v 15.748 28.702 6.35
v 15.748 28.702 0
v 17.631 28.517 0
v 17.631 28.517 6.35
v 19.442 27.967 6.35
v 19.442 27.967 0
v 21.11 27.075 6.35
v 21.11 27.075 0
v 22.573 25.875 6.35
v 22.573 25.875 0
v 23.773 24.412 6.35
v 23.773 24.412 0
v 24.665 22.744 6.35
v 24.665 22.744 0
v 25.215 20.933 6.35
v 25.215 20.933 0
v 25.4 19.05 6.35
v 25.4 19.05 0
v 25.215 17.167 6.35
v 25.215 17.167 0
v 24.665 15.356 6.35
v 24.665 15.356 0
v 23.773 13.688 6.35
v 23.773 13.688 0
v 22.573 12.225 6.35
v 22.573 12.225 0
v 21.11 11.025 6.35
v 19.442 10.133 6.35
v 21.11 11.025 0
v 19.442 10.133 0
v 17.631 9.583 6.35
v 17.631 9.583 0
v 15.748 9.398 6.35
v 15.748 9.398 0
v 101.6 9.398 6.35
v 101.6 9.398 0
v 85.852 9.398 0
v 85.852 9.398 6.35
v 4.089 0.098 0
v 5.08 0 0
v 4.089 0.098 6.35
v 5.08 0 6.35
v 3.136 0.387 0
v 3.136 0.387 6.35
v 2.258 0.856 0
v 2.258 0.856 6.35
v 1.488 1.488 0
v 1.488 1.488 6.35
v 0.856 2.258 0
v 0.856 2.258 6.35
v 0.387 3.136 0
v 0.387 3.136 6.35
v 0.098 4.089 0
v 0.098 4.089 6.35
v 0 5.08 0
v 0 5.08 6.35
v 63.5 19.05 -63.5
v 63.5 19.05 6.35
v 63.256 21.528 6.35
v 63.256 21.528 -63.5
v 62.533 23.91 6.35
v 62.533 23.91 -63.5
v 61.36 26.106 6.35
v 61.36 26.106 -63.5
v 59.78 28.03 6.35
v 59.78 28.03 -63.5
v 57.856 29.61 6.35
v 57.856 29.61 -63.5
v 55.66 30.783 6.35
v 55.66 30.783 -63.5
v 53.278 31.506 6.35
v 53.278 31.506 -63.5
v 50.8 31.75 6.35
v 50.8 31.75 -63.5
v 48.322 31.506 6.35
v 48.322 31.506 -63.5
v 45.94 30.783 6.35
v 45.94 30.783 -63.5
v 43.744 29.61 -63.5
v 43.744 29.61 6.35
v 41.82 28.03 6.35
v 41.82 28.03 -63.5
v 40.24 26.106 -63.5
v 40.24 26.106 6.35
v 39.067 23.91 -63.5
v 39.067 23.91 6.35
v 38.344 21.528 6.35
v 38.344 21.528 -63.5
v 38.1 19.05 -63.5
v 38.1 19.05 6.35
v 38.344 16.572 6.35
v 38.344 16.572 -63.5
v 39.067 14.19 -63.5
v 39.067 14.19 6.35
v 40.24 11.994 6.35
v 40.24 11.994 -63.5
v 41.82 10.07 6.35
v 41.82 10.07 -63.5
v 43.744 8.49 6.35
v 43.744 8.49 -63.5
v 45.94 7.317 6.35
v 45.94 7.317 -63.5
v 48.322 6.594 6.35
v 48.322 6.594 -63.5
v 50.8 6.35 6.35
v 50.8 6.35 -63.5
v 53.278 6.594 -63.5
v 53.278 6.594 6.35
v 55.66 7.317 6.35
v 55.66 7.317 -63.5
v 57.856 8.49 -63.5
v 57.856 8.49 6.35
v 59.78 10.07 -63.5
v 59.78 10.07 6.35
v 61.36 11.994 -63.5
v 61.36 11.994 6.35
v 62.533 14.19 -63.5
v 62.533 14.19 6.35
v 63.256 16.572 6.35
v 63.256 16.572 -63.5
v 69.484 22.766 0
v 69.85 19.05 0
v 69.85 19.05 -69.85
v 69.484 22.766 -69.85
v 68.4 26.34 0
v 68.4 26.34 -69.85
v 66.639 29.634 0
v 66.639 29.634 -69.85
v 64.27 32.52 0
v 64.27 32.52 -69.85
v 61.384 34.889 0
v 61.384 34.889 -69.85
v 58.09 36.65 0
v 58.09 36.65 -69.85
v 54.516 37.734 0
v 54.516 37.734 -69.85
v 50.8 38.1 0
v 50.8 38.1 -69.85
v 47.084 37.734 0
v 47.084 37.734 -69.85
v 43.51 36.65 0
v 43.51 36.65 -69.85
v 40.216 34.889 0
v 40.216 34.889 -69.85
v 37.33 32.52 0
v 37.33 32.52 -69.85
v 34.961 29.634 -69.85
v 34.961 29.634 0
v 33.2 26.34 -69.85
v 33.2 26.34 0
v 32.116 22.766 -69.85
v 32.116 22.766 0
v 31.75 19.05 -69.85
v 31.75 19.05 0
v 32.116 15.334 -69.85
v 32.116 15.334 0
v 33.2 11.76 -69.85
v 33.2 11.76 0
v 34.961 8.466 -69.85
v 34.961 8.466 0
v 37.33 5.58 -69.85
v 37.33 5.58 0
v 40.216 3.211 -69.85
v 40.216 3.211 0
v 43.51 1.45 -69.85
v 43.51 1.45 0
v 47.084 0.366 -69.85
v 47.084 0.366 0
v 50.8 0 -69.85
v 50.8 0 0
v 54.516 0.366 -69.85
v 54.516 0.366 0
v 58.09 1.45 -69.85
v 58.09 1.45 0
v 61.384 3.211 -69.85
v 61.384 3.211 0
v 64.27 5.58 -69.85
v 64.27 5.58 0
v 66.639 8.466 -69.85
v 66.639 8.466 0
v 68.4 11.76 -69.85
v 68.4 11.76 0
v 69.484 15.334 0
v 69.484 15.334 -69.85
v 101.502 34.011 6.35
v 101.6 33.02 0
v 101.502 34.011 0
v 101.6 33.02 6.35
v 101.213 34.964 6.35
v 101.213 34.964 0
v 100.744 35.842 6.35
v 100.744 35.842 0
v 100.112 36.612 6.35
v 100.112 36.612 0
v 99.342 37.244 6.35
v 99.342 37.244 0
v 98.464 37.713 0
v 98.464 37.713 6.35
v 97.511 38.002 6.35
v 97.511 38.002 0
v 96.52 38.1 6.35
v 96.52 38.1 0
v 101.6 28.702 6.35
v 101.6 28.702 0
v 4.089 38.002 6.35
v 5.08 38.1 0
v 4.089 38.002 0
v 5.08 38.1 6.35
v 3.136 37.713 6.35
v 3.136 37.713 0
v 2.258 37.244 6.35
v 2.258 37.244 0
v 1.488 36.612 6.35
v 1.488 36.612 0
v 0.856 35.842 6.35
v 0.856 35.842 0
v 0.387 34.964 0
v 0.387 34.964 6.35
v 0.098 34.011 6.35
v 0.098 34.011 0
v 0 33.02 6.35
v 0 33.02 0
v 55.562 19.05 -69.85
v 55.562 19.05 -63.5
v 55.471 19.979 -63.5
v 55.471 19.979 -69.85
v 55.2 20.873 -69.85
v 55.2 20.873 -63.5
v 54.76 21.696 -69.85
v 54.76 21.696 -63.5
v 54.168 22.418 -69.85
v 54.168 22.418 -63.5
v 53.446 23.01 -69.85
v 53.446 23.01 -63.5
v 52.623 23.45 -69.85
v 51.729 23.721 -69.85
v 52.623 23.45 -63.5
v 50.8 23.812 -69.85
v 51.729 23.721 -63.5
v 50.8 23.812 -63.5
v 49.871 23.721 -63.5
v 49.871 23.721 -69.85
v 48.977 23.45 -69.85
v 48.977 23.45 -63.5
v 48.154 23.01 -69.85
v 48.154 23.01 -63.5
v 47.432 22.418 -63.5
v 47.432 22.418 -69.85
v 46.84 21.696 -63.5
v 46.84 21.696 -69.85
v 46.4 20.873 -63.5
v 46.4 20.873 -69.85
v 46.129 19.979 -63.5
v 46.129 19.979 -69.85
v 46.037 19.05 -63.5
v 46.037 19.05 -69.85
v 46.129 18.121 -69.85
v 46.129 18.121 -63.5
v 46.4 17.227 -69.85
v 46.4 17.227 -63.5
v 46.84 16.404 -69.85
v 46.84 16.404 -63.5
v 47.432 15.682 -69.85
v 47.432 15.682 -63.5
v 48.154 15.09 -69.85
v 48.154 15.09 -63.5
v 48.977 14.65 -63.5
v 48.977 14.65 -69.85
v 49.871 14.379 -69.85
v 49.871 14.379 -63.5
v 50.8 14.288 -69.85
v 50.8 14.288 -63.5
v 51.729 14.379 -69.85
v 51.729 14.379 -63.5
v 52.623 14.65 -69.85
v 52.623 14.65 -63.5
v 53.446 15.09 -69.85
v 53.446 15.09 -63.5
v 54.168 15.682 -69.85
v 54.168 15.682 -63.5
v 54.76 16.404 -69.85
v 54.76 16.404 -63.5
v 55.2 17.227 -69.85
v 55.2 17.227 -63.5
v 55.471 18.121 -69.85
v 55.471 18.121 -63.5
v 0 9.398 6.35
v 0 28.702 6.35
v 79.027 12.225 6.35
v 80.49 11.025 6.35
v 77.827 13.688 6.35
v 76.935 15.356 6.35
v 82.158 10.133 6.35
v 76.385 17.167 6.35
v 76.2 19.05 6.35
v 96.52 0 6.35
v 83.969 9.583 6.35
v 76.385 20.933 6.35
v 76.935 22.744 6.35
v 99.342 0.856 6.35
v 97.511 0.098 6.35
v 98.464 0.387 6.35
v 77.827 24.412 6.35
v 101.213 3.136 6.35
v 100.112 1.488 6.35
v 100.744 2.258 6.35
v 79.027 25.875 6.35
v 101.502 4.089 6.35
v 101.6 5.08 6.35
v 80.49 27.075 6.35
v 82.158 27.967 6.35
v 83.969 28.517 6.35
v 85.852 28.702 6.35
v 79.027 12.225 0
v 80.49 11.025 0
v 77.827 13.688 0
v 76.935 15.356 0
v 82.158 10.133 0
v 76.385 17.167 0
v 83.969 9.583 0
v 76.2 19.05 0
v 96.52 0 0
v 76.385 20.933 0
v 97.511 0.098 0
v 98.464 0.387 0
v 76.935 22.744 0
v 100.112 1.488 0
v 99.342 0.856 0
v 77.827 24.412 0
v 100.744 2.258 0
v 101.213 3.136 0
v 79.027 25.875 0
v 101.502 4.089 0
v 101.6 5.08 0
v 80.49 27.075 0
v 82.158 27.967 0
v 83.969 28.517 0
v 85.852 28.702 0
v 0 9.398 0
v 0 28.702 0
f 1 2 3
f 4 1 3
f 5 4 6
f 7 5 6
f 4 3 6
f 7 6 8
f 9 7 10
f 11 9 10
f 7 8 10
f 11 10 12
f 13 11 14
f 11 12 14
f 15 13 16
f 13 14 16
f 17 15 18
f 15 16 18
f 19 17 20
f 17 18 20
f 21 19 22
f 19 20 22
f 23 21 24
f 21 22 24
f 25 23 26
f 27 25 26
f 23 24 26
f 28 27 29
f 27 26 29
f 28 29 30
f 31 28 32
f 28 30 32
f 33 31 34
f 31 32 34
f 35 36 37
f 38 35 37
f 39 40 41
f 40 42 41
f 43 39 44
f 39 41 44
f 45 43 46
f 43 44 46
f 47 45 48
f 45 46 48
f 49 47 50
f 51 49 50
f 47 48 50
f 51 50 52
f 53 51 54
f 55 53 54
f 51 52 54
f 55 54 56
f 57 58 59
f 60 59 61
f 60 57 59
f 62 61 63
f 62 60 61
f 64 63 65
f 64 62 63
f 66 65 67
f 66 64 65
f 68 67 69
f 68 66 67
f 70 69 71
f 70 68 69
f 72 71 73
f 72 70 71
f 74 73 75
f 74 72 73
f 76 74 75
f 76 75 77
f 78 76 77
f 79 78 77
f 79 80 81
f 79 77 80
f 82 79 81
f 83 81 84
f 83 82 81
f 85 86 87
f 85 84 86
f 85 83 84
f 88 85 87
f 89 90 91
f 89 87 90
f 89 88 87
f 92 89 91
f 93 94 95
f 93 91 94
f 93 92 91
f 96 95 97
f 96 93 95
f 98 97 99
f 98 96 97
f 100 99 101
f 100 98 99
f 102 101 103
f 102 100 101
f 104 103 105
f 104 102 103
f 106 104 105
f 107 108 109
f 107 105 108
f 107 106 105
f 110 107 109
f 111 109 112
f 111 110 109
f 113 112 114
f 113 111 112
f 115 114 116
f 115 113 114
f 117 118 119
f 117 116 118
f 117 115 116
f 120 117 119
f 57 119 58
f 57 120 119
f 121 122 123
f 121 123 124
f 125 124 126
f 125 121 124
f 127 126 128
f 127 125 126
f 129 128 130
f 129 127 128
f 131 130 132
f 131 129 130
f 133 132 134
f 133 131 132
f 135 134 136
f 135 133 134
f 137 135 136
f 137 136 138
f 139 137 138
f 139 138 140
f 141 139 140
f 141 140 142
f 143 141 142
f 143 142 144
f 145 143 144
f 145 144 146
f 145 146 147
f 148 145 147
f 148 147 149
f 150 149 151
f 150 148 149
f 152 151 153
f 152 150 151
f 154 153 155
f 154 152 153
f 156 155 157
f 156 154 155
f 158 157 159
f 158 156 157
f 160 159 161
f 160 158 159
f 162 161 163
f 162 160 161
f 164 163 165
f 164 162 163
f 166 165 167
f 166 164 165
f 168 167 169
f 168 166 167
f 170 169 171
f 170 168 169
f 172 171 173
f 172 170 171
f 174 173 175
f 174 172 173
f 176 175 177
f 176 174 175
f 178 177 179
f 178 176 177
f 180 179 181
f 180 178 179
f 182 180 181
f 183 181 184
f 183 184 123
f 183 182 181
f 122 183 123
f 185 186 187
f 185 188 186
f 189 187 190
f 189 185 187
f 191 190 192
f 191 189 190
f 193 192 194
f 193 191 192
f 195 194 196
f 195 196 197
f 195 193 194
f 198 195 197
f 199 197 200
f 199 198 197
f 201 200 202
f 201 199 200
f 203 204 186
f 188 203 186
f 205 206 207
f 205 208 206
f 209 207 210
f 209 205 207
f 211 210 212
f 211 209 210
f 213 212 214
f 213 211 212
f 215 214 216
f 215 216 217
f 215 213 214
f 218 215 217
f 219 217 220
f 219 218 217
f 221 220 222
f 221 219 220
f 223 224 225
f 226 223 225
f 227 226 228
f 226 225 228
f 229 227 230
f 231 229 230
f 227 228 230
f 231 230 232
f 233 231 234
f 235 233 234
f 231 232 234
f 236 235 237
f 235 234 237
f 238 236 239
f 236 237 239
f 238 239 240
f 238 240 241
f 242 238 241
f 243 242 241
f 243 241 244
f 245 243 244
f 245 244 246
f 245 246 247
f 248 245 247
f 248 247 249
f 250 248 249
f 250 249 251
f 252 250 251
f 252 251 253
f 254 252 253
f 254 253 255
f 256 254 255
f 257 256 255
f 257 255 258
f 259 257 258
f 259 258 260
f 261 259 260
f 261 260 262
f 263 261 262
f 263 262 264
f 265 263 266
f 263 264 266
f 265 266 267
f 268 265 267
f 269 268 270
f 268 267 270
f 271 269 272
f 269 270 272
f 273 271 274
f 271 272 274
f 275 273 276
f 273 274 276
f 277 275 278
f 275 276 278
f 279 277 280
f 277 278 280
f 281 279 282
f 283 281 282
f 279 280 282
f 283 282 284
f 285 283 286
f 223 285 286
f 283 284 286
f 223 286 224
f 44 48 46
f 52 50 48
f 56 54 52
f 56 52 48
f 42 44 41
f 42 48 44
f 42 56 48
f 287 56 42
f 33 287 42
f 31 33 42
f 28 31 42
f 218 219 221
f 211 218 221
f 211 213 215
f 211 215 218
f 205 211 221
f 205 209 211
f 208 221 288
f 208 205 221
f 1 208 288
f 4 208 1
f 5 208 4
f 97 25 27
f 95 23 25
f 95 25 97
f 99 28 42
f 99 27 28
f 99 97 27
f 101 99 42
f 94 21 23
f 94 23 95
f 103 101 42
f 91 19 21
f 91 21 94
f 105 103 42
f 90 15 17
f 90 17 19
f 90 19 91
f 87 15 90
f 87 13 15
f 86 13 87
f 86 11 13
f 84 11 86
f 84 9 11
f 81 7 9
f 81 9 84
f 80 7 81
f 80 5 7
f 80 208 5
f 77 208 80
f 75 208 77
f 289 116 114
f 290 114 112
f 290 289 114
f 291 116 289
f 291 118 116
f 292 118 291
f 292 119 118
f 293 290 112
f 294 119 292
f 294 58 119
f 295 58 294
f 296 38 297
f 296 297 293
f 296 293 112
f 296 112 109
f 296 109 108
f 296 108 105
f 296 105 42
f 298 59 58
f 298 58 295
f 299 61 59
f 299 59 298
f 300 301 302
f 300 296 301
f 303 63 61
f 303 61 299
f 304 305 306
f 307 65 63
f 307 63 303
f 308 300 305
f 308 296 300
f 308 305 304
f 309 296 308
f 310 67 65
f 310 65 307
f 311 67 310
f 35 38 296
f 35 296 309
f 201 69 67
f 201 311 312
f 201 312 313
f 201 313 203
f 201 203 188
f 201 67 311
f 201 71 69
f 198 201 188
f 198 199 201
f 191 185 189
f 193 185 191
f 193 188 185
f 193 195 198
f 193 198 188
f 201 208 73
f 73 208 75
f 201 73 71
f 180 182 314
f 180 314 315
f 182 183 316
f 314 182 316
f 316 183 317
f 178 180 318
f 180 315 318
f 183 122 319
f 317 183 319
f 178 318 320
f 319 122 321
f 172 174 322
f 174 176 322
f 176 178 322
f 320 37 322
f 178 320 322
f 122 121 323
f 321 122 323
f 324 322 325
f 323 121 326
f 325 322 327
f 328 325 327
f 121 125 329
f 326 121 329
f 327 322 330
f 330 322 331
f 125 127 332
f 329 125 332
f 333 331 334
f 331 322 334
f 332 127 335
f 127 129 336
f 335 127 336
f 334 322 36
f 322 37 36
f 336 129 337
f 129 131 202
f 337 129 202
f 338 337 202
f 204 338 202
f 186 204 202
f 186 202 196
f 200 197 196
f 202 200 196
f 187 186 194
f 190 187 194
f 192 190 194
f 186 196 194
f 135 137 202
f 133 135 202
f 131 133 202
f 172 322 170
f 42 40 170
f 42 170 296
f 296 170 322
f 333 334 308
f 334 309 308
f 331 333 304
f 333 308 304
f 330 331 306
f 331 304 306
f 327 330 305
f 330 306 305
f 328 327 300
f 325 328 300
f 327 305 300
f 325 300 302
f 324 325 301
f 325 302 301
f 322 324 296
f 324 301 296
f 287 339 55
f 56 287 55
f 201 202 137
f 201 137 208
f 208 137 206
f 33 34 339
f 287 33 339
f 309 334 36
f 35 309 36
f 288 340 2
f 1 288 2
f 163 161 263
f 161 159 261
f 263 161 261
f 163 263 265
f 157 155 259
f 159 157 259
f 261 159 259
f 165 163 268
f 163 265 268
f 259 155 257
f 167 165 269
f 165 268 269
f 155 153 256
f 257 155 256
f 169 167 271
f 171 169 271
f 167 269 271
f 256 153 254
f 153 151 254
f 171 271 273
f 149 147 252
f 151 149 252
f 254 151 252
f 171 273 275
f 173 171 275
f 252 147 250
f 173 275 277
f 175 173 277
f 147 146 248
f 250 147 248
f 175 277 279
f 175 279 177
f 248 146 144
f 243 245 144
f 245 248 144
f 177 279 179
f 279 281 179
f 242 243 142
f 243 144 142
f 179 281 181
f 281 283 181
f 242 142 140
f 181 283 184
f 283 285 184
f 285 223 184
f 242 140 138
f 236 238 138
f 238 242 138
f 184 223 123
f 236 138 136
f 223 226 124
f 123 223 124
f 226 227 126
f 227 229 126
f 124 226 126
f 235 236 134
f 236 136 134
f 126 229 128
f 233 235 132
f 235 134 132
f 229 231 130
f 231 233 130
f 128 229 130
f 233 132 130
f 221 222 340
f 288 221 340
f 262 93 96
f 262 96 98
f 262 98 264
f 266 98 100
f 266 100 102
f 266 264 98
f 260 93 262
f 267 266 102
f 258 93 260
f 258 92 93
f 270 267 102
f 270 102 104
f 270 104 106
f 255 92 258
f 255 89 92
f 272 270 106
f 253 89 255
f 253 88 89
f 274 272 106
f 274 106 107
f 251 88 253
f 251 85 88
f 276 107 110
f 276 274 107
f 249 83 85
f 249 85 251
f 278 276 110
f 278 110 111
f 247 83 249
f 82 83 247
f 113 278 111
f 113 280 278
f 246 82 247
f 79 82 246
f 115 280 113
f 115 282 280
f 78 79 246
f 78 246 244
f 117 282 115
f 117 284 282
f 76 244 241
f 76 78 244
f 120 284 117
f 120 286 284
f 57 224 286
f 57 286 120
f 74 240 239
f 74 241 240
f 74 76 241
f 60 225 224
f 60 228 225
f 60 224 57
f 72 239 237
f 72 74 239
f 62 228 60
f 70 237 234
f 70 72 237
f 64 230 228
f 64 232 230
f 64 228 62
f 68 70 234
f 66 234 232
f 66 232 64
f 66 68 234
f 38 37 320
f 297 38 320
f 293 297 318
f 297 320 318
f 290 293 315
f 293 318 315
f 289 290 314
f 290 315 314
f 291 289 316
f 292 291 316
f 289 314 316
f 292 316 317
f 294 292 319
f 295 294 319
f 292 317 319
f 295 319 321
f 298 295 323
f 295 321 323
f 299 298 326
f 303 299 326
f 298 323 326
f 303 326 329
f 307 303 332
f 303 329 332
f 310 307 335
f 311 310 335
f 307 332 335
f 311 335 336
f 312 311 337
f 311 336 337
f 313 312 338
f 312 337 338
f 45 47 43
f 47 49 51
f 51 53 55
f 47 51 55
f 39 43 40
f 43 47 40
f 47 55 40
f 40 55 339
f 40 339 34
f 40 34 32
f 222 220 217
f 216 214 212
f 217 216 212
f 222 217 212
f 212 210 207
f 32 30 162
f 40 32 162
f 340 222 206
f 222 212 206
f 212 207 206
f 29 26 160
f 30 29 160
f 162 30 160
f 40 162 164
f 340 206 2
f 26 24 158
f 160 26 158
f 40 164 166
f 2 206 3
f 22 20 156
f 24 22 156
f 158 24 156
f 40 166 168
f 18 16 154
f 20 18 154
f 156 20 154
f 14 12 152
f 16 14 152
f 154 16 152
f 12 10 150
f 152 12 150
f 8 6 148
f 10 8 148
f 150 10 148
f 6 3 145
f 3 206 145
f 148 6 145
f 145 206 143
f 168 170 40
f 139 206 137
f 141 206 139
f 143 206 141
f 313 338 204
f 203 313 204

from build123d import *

# Parameters (mm, degrees)
F1_DEPTH      = 6.35
F2_R          = 19.05
F2_R_2        = 4.7625
F4_DEPTH      = 69.85
F3_R          = 12.7
F5_DEPTH      = 63.5
F5_DEPTH_BACK = 25.4
F6_R          = 5.08


with BuildPart() as f1:
    # F0 (on Top) → F1 (new body)
    with BuildSketch(Plane.XY):
        with BuildLine():
            Line((0, 9.398), (0, 0))
            Line((0, 0), (101.6, 0))
            Line((101.6, 0), (101.6, 9.398))
            Line((101.6, 9.398), (85.852, 9.398))
            ThreePointArc((85.852, 9.398), (76.2, 19.05), (85.852, 28.702))
            Line((85.852, 28.702), (101.6, 28.702))
            Line((101.6, 28.702), (101.6, 38.1))
            Line((101.6, 38.1), (0, 38.1))
            Line((0, 38.1), (0, 28.702))
            Line((0, 28.702), (15.748, 28.702))
            ThreePointArc((15.748, 28.702), (25.4, 19.05), (15.748, 9.398))
            Line((15.748, 9.398), (0, 9.398))
        make_face()
    extrude(amount=F1_DEPTH)

    # F2 (on Top) → F4 (join)
    with BuildSketch(Plane.XY):
        with Locations((50.8, 19.05)):
            Circle(F2_R)
        with Locations((50.8, 19.05)):
            Circle(F2_R_2, mode=Mode.SUBTRACT)
    extrude(amount=-F4_DEPTH)

    # F3 (on Top) → F5 (cut, two sides)
    with BuildSketch(Plane.XY) as f5_sk:
        with Locations((50.8, 19.05)):
            Circle(F3_R)
    extrude(amount=-F5_DEPTH, mode=Mode.SUBTRACT)
    extrude(f5_sk.sketch, amount=F5_DEPTH_BACK, mode=Mode.SUBTRACT)

    # F6
    f6_edges = [f1.edges().sort_by_distance(p)[0] for p in [
        (101.6, 0, 3.175),
        (101.6, 38.1, 3.175),
        (0, 0, 3.175),
        (0, 38.1, 3.175),
    ]]
    fillet(f6_edges, radius=F6_R)


solid = f1.part
